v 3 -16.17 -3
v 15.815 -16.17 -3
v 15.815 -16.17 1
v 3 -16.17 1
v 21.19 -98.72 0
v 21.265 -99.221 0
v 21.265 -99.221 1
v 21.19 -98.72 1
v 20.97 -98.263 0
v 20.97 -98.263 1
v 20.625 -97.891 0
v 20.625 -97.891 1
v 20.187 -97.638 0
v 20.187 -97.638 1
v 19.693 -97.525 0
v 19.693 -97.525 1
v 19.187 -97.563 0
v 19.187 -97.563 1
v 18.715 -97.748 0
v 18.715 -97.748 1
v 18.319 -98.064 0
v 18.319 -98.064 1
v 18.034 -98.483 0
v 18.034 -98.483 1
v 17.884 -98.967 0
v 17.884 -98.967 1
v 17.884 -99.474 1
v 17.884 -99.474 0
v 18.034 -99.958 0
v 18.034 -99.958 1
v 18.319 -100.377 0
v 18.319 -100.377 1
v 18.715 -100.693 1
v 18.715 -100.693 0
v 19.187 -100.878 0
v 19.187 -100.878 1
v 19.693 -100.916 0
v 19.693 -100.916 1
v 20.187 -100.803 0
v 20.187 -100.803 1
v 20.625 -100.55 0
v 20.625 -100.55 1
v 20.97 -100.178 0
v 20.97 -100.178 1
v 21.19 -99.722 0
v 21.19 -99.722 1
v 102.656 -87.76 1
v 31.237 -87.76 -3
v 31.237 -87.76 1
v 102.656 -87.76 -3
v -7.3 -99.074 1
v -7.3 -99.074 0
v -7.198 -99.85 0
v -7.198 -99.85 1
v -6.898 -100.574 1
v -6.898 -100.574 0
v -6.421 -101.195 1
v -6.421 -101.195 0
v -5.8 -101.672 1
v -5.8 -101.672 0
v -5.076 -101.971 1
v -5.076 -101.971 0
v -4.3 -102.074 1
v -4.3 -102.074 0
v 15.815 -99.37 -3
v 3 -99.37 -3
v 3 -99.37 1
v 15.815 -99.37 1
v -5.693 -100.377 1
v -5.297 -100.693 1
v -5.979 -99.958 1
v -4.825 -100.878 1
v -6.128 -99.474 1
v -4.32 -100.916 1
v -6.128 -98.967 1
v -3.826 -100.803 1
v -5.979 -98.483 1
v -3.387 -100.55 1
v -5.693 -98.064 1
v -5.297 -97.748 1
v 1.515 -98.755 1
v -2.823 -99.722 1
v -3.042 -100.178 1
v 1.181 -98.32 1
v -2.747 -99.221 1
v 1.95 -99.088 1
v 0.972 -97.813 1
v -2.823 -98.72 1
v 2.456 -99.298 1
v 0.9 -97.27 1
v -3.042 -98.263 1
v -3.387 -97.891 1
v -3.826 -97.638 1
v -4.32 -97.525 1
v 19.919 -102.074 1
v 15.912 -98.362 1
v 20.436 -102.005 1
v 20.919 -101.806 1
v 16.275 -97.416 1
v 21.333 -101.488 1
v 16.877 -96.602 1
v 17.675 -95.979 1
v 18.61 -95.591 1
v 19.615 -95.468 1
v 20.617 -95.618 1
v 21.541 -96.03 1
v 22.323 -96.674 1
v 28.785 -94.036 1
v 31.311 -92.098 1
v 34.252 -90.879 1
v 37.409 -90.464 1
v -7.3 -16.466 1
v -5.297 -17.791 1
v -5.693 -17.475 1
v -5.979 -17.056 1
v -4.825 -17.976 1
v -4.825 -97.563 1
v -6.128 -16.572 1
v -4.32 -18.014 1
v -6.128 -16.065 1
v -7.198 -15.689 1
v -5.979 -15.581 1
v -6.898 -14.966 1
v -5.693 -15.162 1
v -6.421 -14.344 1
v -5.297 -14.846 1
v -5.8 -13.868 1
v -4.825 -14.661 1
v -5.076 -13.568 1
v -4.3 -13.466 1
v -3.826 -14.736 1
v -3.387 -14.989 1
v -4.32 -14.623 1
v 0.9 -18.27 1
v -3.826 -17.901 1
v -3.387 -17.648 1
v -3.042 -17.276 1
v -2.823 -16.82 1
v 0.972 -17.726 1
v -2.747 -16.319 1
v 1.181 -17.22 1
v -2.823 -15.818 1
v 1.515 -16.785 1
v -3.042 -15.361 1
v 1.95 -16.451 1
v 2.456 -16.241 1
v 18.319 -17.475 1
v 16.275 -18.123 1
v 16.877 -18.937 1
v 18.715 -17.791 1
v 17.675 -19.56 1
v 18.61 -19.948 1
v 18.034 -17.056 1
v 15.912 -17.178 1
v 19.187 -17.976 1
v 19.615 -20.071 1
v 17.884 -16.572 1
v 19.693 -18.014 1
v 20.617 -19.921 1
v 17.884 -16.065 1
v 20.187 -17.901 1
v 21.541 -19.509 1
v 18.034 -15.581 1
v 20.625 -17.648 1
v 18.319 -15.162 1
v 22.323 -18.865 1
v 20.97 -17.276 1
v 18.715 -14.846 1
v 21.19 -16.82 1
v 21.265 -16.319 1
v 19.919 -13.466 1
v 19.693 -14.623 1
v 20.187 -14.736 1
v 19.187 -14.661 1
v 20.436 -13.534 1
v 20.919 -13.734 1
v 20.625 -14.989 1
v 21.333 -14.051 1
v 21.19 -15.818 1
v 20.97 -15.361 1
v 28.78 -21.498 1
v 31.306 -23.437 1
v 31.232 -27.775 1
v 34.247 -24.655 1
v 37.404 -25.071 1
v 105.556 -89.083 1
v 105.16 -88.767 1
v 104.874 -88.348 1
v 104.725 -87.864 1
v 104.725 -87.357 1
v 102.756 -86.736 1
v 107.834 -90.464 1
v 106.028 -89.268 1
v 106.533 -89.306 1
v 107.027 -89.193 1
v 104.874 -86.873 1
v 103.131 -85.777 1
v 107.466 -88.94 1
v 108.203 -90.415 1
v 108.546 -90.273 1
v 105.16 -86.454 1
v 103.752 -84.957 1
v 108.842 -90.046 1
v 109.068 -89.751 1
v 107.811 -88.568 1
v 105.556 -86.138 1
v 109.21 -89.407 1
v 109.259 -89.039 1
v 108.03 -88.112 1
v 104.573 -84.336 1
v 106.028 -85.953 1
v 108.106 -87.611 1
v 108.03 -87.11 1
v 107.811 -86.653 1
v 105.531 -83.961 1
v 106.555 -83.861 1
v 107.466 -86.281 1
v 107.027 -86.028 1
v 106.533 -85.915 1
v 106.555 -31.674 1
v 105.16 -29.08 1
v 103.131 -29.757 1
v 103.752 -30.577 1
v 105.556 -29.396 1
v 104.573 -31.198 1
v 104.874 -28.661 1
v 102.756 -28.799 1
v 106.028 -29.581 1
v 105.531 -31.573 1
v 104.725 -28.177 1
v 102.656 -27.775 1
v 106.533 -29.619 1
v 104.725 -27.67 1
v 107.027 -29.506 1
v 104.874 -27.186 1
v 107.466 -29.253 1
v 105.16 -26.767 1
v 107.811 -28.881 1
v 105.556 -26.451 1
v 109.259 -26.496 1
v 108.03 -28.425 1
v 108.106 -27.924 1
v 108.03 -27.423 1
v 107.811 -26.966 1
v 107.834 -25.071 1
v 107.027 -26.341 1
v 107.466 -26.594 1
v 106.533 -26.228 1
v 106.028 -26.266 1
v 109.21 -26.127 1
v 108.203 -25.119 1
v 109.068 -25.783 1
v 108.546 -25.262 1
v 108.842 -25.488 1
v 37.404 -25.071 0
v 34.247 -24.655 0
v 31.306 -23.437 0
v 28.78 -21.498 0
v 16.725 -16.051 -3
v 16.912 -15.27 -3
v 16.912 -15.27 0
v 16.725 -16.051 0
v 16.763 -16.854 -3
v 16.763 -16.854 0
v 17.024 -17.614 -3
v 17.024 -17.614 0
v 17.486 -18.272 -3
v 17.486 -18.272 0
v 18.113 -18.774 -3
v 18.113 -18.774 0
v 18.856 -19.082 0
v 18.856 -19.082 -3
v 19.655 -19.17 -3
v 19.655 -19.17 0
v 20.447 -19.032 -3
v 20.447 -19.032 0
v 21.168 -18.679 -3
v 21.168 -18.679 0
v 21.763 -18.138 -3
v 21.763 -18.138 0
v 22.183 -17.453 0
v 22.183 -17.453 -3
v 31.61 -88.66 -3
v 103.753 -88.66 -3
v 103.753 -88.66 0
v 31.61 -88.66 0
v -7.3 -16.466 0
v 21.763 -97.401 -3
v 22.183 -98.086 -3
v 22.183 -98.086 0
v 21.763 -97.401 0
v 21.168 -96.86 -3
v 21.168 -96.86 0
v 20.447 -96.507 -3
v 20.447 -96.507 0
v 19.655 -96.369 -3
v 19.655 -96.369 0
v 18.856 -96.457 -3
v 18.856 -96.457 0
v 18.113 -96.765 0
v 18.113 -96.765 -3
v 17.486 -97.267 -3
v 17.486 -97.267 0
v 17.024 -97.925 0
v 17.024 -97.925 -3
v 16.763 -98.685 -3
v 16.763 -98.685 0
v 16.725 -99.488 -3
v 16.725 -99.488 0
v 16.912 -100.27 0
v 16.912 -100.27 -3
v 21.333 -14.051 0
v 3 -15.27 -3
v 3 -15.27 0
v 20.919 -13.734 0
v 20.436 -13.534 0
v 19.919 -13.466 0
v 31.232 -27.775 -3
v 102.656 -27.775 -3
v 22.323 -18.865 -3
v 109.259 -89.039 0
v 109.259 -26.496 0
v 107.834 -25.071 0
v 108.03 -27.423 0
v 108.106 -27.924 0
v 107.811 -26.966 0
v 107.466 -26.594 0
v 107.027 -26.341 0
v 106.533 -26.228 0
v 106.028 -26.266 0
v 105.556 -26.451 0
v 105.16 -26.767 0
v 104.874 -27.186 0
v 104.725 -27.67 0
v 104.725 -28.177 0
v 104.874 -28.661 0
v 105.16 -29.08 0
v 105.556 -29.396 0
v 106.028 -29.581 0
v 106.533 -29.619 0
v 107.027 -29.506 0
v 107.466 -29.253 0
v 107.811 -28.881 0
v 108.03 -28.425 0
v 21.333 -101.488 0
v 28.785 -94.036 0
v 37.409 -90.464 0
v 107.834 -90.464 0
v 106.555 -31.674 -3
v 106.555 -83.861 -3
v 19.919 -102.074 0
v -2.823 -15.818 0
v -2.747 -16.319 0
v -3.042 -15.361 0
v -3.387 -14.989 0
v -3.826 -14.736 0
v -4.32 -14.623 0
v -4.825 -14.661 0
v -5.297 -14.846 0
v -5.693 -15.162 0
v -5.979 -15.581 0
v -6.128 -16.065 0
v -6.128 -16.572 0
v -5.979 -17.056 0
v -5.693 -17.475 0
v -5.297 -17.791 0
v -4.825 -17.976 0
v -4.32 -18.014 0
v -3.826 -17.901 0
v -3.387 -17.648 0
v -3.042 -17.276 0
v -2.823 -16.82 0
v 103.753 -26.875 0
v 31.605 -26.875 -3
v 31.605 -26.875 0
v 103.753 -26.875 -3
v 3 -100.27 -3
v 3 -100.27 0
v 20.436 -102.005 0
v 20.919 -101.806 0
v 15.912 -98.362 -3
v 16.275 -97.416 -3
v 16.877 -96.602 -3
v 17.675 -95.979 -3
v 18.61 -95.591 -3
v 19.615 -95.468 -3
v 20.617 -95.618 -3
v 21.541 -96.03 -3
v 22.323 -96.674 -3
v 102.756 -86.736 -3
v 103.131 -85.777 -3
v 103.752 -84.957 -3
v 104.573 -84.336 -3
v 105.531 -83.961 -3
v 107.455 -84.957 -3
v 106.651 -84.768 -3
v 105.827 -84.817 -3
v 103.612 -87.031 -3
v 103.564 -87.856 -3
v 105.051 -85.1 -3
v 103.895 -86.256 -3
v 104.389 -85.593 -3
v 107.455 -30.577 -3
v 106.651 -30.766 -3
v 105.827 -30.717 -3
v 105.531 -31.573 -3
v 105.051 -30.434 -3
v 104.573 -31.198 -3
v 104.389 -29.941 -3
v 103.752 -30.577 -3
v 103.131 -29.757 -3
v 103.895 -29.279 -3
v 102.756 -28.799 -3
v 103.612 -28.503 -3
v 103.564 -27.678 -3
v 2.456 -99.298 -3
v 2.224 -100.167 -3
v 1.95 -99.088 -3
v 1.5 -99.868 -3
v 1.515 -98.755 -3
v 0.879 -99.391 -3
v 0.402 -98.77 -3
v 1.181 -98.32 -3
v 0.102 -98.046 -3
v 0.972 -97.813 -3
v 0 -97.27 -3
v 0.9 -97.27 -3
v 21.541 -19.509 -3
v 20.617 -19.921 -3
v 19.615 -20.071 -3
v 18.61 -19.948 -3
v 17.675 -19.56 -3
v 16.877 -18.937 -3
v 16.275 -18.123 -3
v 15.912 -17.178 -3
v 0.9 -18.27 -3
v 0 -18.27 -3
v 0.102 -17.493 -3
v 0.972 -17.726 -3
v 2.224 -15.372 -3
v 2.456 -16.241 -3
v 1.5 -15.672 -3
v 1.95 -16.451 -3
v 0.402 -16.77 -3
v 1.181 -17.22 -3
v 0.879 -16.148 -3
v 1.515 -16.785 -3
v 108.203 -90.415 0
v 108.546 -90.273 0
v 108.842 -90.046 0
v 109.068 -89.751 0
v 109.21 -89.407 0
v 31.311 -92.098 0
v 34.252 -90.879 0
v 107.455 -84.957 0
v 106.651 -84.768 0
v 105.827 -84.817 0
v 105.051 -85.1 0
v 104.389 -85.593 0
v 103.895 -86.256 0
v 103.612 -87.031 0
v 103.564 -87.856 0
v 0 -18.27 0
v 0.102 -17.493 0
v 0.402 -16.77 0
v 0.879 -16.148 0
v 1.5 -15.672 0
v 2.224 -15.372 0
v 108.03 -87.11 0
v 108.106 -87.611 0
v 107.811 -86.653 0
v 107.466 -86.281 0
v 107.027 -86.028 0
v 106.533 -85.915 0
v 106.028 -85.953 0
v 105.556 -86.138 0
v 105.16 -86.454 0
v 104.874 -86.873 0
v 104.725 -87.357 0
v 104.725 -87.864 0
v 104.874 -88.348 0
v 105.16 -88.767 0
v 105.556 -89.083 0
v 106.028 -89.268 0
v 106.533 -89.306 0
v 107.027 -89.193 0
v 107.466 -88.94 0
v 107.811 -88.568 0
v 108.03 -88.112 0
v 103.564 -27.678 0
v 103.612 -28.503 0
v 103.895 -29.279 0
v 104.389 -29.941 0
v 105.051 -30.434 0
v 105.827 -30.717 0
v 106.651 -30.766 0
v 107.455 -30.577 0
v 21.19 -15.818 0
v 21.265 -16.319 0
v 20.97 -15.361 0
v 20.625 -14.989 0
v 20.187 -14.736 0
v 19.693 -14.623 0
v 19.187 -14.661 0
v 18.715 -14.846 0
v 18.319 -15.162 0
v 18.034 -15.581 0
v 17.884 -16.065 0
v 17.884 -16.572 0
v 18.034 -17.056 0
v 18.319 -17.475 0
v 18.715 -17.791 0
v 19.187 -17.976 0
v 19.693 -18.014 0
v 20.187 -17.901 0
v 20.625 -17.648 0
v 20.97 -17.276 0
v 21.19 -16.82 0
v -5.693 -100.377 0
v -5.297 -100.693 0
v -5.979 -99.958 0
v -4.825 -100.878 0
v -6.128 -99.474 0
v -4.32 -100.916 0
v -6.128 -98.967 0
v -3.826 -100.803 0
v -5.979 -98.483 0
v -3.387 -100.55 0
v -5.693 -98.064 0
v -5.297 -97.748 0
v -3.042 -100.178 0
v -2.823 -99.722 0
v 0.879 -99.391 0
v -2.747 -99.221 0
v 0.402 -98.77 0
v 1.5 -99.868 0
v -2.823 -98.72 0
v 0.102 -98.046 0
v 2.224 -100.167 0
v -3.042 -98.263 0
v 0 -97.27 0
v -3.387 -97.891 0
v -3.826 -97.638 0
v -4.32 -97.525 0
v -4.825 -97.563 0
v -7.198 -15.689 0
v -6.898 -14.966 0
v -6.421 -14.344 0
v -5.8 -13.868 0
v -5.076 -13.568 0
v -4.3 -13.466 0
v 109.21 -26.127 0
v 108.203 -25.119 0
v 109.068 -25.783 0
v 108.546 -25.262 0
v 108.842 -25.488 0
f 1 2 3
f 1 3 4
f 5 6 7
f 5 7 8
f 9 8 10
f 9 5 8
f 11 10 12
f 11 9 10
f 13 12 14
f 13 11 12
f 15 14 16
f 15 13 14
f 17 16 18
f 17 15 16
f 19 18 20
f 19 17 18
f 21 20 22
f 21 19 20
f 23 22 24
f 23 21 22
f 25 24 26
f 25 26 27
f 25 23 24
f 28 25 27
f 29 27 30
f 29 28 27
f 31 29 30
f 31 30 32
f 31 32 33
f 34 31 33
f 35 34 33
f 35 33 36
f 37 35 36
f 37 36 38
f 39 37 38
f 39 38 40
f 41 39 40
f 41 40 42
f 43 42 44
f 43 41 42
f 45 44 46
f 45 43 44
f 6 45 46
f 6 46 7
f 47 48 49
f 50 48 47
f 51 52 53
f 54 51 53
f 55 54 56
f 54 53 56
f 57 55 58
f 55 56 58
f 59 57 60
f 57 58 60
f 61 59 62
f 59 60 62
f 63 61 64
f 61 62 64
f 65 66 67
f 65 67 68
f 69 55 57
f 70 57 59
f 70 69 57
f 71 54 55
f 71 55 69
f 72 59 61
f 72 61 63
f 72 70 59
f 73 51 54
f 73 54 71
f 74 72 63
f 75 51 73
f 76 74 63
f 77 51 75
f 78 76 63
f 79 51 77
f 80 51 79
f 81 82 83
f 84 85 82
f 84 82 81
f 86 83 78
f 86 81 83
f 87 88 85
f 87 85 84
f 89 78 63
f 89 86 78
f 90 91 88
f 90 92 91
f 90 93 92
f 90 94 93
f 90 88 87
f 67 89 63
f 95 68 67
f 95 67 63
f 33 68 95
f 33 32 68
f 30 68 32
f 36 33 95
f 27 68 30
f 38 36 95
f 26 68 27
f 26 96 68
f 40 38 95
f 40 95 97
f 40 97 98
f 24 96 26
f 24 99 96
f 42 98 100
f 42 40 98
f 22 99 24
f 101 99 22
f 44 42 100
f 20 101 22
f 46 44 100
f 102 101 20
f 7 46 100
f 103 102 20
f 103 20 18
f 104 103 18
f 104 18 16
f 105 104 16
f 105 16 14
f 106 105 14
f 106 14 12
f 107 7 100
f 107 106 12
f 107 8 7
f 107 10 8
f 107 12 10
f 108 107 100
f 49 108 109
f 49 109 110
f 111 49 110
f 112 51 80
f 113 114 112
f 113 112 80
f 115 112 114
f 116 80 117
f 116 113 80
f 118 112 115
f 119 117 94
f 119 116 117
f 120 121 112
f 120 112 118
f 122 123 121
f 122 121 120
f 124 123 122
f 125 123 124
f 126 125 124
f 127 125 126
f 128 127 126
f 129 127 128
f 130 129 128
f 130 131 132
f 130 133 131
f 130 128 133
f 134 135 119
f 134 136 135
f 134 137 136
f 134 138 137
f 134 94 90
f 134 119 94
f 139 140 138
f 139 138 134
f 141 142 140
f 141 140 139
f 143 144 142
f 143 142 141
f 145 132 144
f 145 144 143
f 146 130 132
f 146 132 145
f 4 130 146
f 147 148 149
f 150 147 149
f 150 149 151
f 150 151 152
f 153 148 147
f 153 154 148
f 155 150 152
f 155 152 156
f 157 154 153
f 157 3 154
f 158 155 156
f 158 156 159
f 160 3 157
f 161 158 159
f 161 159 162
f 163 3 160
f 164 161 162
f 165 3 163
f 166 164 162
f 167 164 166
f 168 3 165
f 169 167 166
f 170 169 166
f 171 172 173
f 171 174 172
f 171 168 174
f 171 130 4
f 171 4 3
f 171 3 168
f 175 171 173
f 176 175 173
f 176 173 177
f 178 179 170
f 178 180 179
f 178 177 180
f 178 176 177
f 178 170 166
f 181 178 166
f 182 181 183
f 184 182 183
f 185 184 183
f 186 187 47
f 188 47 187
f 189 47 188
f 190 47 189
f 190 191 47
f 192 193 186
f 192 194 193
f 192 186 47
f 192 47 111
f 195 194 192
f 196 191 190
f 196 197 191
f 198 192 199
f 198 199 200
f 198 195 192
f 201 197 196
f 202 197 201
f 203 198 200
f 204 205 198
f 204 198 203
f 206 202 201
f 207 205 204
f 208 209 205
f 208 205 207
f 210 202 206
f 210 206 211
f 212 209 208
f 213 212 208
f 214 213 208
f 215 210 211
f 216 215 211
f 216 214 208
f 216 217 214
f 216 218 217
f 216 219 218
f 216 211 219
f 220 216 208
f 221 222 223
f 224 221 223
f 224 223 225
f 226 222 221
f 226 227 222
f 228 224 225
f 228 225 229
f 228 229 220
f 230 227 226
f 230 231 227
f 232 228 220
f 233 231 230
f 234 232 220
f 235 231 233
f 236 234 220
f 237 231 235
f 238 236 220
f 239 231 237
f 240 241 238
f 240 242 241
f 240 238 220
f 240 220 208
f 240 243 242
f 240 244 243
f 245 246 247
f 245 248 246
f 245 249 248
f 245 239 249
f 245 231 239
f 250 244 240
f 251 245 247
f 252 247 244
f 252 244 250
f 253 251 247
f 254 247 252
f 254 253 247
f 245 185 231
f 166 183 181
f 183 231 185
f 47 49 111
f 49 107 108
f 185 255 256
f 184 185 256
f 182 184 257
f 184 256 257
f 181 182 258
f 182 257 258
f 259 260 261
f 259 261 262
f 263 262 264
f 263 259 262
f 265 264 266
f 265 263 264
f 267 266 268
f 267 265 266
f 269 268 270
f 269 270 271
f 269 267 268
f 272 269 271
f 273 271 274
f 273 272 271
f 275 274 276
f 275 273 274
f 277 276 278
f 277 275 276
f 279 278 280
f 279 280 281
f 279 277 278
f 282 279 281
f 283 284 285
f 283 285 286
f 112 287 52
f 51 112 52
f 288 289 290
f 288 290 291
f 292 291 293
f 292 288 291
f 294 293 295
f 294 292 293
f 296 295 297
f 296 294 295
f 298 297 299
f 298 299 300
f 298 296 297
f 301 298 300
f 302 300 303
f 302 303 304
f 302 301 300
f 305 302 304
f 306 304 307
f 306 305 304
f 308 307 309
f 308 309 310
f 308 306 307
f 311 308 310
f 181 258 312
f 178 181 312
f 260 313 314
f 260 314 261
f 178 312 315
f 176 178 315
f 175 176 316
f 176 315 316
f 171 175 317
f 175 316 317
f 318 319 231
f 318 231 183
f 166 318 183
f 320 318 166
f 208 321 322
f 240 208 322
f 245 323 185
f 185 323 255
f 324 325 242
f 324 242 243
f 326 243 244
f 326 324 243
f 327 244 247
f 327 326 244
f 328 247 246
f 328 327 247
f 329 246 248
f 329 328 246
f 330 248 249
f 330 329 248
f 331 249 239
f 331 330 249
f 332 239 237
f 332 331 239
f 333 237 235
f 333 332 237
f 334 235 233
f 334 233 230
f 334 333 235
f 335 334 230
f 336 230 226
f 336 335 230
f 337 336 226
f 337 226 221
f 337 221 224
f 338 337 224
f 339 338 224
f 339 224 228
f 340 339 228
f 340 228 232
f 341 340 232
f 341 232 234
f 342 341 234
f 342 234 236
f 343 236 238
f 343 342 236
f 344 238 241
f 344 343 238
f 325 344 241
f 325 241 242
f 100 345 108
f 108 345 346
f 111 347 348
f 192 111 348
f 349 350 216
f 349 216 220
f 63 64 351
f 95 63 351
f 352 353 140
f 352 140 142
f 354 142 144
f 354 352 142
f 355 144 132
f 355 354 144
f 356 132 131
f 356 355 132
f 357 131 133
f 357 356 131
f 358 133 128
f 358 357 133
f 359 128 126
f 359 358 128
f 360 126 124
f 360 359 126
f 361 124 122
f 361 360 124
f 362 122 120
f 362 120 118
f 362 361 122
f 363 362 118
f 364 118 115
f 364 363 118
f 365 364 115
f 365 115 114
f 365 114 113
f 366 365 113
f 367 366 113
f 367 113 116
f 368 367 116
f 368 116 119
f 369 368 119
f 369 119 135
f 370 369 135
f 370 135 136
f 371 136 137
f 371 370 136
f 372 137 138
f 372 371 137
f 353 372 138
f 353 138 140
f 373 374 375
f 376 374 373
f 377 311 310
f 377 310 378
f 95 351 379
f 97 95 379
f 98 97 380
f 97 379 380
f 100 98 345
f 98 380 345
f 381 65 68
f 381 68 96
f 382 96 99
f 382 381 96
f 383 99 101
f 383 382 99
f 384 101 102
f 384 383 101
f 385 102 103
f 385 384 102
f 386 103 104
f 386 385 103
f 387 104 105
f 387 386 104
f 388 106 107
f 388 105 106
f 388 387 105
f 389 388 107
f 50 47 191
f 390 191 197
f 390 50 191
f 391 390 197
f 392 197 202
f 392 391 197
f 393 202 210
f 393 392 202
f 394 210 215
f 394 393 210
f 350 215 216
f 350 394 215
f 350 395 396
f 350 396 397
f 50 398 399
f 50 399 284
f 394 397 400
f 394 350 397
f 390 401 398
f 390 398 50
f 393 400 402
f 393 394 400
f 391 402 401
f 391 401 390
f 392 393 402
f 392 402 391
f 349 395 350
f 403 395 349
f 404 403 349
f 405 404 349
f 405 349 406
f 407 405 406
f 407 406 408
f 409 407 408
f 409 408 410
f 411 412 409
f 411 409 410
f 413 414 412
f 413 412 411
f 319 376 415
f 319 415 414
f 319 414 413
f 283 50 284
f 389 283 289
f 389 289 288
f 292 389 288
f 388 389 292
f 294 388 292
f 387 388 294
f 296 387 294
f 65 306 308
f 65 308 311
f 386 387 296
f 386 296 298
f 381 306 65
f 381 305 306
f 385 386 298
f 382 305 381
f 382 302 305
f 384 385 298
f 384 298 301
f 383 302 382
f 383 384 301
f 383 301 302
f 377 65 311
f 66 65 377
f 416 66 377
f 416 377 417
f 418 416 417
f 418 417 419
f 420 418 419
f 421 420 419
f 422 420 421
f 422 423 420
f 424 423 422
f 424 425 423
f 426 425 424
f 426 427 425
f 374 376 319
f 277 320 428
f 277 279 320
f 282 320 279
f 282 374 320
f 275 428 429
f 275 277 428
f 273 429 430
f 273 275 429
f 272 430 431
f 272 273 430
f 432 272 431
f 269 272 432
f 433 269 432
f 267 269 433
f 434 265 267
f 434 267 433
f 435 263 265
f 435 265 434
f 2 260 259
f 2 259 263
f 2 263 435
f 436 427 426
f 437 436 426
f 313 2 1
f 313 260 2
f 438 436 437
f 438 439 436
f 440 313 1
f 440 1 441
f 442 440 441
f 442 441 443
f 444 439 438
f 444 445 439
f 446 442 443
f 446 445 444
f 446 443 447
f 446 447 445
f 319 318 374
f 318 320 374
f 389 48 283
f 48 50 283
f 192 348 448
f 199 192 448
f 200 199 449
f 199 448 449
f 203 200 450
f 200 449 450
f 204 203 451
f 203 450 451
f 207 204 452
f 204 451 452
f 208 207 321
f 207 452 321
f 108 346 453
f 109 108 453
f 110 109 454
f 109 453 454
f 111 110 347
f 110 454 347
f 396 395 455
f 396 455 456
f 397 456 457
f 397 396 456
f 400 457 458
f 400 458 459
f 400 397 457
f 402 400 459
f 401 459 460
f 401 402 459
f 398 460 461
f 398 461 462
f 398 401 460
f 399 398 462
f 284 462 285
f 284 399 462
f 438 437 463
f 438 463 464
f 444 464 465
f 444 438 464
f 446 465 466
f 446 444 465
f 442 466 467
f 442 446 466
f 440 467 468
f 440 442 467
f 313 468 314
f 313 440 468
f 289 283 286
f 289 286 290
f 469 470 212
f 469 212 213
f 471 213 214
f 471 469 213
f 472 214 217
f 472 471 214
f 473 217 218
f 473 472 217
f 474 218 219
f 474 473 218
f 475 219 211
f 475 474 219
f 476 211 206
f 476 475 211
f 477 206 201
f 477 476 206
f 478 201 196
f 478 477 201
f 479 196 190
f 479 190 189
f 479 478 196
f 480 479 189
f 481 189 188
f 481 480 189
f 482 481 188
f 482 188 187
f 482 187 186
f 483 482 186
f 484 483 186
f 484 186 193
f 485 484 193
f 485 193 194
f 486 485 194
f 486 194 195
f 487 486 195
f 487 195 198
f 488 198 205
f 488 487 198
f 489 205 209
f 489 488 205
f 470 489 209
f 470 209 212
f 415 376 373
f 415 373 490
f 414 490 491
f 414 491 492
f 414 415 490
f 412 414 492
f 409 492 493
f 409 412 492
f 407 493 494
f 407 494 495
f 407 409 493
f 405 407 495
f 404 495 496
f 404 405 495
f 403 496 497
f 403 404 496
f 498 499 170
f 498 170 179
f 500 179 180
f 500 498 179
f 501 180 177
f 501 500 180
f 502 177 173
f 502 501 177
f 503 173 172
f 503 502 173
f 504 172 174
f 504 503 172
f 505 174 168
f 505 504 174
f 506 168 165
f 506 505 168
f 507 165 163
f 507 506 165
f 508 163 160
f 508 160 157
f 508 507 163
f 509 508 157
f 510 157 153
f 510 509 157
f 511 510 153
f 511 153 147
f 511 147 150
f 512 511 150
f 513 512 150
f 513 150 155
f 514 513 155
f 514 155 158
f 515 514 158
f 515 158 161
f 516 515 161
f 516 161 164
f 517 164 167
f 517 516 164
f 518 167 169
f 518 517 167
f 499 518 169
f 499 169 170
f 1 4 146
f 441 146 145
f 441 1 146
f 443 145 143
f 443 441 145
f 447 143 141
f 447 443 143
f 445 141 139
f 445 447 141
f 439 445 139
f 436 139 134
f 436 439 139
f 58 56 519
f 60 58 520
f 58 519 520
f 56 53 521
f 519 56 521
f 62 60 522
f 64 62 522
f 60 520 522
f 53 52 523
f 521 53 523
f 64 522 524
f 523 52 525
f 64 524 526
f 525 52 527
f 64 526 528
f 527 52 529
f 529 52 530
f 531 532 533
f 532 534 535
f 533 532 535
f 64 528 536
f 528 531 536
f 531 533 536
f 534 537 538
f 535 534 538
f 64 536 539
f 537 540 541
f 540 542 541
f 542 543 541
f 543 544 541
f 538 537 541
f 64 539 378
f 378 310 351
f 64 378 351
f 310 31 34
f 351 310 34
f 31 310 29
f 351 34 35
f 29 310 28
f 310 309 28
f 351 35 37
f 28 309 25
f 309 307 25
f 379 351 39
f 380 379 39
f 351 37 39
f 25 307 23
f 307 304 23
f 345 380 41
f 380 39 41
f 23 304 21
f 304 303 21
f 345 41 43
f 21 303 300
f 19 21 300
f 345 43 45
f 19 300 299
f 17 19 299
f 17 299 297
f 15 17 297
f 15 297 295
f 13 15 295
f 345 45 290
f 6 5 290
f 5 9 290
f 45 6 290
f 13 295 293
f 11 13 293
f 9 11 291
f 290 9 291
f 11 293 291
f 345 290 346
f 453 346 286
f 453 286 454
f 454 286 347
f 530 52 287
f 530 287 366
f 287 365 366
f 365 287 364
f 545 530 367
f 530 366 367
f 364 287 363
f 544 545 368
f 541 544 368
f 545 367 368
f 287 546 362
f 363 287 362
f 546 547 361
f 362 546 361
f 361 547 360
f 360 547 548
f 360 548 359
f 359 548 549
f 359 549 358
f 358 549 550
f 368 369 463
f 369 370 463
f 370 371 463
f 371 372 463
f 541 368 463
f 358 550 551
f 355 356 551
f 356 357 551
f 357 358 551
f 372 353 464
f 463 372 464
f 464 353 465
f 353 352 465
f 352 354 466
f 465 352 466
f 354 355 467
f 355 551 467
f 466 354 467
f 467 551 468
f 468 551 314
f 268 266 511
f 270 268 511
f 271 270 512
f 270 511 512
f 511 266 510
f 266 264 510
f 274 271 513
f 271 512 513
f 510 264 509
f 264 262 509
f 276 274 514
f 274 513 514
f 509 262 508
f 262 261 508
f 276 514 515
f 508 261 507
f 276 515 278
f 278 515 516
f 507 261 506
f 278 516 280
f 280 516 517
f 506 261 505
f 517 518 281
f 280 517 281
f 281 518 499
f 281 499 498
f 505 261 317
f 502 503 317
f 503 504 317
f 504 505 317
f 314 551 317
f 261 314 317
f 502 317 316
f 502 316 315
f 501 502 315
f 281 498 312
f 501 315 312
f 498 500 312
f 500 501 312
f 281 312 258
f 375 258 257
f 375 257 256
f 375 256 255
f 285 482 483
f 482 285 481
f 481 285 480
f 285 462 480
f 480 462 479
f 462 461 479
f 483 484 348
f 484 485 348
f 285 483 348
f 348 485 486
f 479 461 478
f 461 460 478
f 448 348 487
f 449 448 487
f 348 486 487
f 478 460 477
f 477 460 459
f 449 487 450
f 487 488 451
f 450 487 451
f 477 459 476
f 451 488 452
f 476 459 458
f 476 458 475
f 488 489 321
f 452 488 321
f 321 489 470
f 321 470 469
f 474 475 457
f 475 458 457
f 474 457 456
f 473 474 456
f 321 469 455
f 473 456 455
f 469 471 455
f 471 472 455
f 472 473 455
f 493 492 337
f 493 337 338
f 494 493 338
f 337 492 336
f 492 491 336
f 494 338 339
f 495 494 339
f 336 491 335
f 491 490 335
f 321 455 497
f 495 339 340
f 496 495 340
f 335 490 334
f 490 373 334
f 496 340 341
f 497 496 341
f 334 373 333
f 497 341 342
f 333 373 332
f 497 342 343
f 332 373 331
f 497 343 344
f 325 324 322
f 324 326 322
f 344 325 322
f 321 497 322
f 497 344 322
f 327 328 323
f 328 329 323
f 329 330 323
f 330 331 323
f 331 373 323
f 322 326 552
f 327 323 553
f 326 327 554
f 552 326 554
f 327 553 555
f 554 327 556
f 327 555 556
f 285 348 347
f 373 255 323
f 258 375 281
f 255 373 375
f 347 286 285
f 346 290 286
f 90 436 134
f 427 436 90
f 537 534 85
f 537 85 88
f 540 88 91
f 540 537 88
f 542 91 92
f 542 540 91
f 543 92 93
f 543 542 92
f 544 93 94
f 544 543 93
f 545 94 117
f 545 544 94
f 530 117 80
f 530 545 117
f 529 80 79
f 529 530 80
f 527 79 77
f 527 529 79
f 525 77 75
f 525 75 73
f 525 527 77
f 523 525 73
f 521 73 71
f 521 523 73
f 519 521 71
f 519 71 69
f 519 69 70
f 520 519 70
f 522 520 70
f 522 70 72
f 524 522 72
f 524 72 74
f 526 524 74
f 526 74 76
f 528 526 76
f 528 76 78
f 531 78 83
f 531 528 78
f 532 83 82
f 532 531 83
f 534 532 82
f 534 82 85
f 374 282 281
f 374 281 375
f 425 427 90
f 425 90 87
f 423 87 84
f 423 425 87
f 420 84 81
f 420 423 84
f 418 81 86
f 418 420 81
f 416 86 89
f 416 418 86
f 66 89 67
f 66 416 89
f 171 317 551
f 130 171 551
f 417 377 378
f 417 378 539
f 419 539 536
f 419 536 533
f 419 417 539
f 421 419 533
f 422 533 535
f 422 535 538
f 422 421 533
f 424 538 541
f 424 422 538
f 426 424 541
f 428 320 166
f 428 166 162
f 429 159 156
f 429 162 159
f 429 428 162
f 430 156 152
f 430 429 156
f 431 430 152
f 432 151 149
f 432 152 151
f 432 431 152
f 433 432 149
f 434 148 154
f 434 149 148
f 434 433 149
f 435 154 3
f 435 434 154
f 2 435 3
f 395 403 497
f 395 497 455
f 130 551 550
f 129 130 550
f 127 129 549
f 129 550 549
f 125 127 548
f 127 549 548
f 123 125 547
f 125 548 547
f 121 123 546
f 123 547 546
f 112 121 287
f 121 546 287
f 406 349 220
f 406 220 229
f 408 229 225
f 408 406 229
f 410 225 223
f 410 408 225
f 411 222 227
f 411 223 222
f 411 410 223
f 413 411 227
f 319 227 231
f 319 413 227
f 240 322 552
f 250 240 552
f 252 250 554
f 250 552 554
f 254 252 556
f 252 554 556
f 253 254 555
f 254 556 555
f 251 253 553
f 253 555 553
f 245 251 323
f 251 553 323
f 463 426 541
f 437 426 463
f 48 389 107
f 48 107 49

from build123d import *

# Parameters (mm, degrees)
SKETCH2_R           = 1.7
BOSS_EXTRUDE1_DEPTH = 1
BOSS_EXTRUDE2_START = -3
BOSS_EXTRUDE2_DEPTH = 3


with BuildPart() as part:
    # Sketch2 → Boss-Extrude1 (new body)
    with BuildSketch(Plane.XY):
        with BuildLine():
            Line((28.78011557, -21.498473491), (21.333027704, -14.051385626))
            ThreePointArc((21.333027704, -14.051385626), (20.684181007, -13.617840123), (19.918814142, -13.465599188))
            Line((19.918814142, -13.465599188), (-4.3, -13.465599188))
            ThreePointArc((-4.3, -13.465599188), (-6.421320344, -14.344278845), (-7.3, -16.465599188))
            Line((-7.3, -16.465599188), (-7.3, -99.073599188))
            ThreePointArc((-7.3, -99.073599188), (-6.421320344, -101.194919532), (-4.3, -102.073599188))
            Line((-4.3, -102.073599188), (19.918814142, -102.073599188))
            ThreePointArc((19.918814142, -102.073599188), (20.684181007, -101.921358253), (21.333027704, -101.48781275))
            Line((21.333027704, -101.48781275), (28.78511557, -94.035724885))
            ThreePointArc((28.78511557, -94.035724885), (32.741782732, -91.39196441), (37.408989873, -90.463599188))
            Line((37.408989873, -90.463599188), (107.834, -90.463599188))
            ThreePointArc((107.834, -90.463599188), (108.841627163, -90.046226351), (109.259, -89.038599188))
            Line((109.259, -89.038599188), (109.259, -26.495599188))
            ThreePointArc((109.259, -26.495599188), (108.841627163, -25.487972025), (107.834, -25.070599188))
            Line((107.834, -25.070599188), (37.403989873, -25.070599188))
            ThreePointArc((37.403989873, -25.070599188), (32.736782732, -24.142233967), (28.78011557, -21.498473491))
        make_face()
        with Locations((106.406, -27.923599188)):
            Circle(SKETCH2_R, mode=Mode.SUBTRACT)
        with Locations((19.565489973, -16.318599188)):
            Circle(SKETCH2_R, mode=Mode.SUBTRACT)
        with Locations((-4.447, -16.318599188)):
            Circle(SKETCH2_R, mode=Mode.SUBTRACT)
        with Locations((-4.447, -99.220599188)):
            Circle(SKETCH2_R, mode=Mode.SUBTRACT)
        with Locations((19.565489973, -99.220599188)):
            Circle(SKETCH2_R, mode=Mode.SUBTRACT)
        with Locations((106.406, -87.610599188)):
            Circle(SKETCH2_R, mode=Mode.SUBTRACT)
        with BuildLine():
            Line((15.815448907, -99.369599188), (3, -99.369599188))
            ThreePointArc((3, -99.369599188), (1.51507576, -98.754523429), (0.9, -97.269599188))
            Line((0.9, -97.269599188), (0.9, -18.269599188))
            ThreePointArc((0.9, -18.269599188), (1.51507576, -16.784674948), (3, -16.169599188))
            Line((3, -16.169599188), (15.815448907, -16.169599188))
            ThreePointArc((15.815448907, -16.169599188), (18.129279051, -19.785919074), (22.322528351, -18.864919746))
            Line((22.322528351, -18.864919746), (31.232207794, -27.774599188))
            Line((31.232207794, -27.774599188), (102.655958934, -27.774599188))
            ThreePointArc((102.655958934, -27.774599188), (103.75222825, -30.577370938), (106.555, -31.673640255))
            Line((106.555, -31.673640255), (106.555, -83.860558122))
            ThreePointArc((106.555, -83.860558122), (103.75222825, -84.956827438), (102.655958934, -87.759599188))
            Line((102.655958934, -87.759599188), (31.237207794, -87.759599188))
            Line((31.237207794, -87.759599188), (22.322528351, -96.674278631))
            ThreePointArc((22.322528351, -96.674278631), (18.129279051, -95.753279303), (15.815448907, -99.369599188))
        make_face(mode=Mode.SUBTRACT)
    extrude(amount=BOSS_EXTRUDE1_DEPTH)

    # Sketch3 → Boss-Extrude2 (add)
    with BuildSketch(Plane.XY.offset(BOSS_EXTRUDE2_START)):
        with BuildLine():
            Line((31.605, -26.874599188), (103.75284942, -26.874599188))
            ThreePointArc((103.75284942, -26.874599188), (104.388624353, -29.940974835), (107.455, -30.576749768))
            Line((107.455, -30.576749768), (107.455, -84.957448608))
            ThreePointArc((107.455, -84.957448608), (104.388624353, -85.593223541), (103.75284942, -88.659599188))
            Line((103.75284942, -88.659599188), (31.61, -88.659599188))
            Line((31.61, -88.659599188), (22.183305753, -98.086293435))
            ThreePointArc((22.183305753, -98.086293435), (18.473694141, -96.584770882), (16.912339393, -100.269599188))
            Line((16.912339393, -100.269599188), (3, -100.269599188))
            ThreePointArc((3, -100.269599188), (0.878679656, -99.390919532), (0, -97.269599188))
            Line((0, -97.269599188), (0, -18.269599188))
            ThreePointArc((0, -18.269599188), (0.878679656, -16.148278845), (3, -15.269599188))
            Line((3, -15.269599188), (16.912339393, -15.269599188))
            ThreePointArc((16.912339393, -15.269599188), (18.473694141, -18.954427494), (22.183305753, -17.452904941))
            Line((22.183305753, -17.452904941), (31.605, -26.874599188))
        make_face()
        with BuildLine():
            Line((102.655958934, -27.774599188), (31.232207794, -27.774599188))
            Line((31.232207794, -27.774599188), (22.322528351, -18.864919746))
            ThreePointArc((22.322528351, -18.864919746), (18.129279051, -19.785919074), (15.815448907, -16.169599188))
            Line((15.815448907, -16.169599188), (3, -16.169599188))
            ThreePointArc((3, -16.169599188), (1.51507576, -16.784674948), (0.9, -18.269599188))
            Line((0.9, -18.269599188), (0.9, -97.269599188))
            ThreePointArc((0.9, -97.269599188), (1.51507576, -98.754523429), (3, -99.369599188))
            Line((3, -99.369599188), (15.815448907, -99.369599188))
            ThreePointArc((15.815448907, -99.369599188), (18.129279051, -95.753279303), (22.322528351, -96.674278631))
            Line((22.322528351, -96.674278631), (31.237207794, -87.759599188))
            Line((31.237207794, -87.759599188), (102.655958934, -87.759599188))
            ThreePointArc((102.655958934, -87.759599188), (103.75222825, -84.956827438), (106.555, -83.860558122))
            Line((106.555, -83.860558122), (106.555, -31.673640255))
            ThreePointArc((106.555, -31.673640255), (103.75222825, -30.577370938), (102.655958934, -27.774599188))
        make_face(mode=Mode.SUBTRACT)
    extrude(amount=BOSS_EXTRUDE2_DEPTH)


solid = part.part
